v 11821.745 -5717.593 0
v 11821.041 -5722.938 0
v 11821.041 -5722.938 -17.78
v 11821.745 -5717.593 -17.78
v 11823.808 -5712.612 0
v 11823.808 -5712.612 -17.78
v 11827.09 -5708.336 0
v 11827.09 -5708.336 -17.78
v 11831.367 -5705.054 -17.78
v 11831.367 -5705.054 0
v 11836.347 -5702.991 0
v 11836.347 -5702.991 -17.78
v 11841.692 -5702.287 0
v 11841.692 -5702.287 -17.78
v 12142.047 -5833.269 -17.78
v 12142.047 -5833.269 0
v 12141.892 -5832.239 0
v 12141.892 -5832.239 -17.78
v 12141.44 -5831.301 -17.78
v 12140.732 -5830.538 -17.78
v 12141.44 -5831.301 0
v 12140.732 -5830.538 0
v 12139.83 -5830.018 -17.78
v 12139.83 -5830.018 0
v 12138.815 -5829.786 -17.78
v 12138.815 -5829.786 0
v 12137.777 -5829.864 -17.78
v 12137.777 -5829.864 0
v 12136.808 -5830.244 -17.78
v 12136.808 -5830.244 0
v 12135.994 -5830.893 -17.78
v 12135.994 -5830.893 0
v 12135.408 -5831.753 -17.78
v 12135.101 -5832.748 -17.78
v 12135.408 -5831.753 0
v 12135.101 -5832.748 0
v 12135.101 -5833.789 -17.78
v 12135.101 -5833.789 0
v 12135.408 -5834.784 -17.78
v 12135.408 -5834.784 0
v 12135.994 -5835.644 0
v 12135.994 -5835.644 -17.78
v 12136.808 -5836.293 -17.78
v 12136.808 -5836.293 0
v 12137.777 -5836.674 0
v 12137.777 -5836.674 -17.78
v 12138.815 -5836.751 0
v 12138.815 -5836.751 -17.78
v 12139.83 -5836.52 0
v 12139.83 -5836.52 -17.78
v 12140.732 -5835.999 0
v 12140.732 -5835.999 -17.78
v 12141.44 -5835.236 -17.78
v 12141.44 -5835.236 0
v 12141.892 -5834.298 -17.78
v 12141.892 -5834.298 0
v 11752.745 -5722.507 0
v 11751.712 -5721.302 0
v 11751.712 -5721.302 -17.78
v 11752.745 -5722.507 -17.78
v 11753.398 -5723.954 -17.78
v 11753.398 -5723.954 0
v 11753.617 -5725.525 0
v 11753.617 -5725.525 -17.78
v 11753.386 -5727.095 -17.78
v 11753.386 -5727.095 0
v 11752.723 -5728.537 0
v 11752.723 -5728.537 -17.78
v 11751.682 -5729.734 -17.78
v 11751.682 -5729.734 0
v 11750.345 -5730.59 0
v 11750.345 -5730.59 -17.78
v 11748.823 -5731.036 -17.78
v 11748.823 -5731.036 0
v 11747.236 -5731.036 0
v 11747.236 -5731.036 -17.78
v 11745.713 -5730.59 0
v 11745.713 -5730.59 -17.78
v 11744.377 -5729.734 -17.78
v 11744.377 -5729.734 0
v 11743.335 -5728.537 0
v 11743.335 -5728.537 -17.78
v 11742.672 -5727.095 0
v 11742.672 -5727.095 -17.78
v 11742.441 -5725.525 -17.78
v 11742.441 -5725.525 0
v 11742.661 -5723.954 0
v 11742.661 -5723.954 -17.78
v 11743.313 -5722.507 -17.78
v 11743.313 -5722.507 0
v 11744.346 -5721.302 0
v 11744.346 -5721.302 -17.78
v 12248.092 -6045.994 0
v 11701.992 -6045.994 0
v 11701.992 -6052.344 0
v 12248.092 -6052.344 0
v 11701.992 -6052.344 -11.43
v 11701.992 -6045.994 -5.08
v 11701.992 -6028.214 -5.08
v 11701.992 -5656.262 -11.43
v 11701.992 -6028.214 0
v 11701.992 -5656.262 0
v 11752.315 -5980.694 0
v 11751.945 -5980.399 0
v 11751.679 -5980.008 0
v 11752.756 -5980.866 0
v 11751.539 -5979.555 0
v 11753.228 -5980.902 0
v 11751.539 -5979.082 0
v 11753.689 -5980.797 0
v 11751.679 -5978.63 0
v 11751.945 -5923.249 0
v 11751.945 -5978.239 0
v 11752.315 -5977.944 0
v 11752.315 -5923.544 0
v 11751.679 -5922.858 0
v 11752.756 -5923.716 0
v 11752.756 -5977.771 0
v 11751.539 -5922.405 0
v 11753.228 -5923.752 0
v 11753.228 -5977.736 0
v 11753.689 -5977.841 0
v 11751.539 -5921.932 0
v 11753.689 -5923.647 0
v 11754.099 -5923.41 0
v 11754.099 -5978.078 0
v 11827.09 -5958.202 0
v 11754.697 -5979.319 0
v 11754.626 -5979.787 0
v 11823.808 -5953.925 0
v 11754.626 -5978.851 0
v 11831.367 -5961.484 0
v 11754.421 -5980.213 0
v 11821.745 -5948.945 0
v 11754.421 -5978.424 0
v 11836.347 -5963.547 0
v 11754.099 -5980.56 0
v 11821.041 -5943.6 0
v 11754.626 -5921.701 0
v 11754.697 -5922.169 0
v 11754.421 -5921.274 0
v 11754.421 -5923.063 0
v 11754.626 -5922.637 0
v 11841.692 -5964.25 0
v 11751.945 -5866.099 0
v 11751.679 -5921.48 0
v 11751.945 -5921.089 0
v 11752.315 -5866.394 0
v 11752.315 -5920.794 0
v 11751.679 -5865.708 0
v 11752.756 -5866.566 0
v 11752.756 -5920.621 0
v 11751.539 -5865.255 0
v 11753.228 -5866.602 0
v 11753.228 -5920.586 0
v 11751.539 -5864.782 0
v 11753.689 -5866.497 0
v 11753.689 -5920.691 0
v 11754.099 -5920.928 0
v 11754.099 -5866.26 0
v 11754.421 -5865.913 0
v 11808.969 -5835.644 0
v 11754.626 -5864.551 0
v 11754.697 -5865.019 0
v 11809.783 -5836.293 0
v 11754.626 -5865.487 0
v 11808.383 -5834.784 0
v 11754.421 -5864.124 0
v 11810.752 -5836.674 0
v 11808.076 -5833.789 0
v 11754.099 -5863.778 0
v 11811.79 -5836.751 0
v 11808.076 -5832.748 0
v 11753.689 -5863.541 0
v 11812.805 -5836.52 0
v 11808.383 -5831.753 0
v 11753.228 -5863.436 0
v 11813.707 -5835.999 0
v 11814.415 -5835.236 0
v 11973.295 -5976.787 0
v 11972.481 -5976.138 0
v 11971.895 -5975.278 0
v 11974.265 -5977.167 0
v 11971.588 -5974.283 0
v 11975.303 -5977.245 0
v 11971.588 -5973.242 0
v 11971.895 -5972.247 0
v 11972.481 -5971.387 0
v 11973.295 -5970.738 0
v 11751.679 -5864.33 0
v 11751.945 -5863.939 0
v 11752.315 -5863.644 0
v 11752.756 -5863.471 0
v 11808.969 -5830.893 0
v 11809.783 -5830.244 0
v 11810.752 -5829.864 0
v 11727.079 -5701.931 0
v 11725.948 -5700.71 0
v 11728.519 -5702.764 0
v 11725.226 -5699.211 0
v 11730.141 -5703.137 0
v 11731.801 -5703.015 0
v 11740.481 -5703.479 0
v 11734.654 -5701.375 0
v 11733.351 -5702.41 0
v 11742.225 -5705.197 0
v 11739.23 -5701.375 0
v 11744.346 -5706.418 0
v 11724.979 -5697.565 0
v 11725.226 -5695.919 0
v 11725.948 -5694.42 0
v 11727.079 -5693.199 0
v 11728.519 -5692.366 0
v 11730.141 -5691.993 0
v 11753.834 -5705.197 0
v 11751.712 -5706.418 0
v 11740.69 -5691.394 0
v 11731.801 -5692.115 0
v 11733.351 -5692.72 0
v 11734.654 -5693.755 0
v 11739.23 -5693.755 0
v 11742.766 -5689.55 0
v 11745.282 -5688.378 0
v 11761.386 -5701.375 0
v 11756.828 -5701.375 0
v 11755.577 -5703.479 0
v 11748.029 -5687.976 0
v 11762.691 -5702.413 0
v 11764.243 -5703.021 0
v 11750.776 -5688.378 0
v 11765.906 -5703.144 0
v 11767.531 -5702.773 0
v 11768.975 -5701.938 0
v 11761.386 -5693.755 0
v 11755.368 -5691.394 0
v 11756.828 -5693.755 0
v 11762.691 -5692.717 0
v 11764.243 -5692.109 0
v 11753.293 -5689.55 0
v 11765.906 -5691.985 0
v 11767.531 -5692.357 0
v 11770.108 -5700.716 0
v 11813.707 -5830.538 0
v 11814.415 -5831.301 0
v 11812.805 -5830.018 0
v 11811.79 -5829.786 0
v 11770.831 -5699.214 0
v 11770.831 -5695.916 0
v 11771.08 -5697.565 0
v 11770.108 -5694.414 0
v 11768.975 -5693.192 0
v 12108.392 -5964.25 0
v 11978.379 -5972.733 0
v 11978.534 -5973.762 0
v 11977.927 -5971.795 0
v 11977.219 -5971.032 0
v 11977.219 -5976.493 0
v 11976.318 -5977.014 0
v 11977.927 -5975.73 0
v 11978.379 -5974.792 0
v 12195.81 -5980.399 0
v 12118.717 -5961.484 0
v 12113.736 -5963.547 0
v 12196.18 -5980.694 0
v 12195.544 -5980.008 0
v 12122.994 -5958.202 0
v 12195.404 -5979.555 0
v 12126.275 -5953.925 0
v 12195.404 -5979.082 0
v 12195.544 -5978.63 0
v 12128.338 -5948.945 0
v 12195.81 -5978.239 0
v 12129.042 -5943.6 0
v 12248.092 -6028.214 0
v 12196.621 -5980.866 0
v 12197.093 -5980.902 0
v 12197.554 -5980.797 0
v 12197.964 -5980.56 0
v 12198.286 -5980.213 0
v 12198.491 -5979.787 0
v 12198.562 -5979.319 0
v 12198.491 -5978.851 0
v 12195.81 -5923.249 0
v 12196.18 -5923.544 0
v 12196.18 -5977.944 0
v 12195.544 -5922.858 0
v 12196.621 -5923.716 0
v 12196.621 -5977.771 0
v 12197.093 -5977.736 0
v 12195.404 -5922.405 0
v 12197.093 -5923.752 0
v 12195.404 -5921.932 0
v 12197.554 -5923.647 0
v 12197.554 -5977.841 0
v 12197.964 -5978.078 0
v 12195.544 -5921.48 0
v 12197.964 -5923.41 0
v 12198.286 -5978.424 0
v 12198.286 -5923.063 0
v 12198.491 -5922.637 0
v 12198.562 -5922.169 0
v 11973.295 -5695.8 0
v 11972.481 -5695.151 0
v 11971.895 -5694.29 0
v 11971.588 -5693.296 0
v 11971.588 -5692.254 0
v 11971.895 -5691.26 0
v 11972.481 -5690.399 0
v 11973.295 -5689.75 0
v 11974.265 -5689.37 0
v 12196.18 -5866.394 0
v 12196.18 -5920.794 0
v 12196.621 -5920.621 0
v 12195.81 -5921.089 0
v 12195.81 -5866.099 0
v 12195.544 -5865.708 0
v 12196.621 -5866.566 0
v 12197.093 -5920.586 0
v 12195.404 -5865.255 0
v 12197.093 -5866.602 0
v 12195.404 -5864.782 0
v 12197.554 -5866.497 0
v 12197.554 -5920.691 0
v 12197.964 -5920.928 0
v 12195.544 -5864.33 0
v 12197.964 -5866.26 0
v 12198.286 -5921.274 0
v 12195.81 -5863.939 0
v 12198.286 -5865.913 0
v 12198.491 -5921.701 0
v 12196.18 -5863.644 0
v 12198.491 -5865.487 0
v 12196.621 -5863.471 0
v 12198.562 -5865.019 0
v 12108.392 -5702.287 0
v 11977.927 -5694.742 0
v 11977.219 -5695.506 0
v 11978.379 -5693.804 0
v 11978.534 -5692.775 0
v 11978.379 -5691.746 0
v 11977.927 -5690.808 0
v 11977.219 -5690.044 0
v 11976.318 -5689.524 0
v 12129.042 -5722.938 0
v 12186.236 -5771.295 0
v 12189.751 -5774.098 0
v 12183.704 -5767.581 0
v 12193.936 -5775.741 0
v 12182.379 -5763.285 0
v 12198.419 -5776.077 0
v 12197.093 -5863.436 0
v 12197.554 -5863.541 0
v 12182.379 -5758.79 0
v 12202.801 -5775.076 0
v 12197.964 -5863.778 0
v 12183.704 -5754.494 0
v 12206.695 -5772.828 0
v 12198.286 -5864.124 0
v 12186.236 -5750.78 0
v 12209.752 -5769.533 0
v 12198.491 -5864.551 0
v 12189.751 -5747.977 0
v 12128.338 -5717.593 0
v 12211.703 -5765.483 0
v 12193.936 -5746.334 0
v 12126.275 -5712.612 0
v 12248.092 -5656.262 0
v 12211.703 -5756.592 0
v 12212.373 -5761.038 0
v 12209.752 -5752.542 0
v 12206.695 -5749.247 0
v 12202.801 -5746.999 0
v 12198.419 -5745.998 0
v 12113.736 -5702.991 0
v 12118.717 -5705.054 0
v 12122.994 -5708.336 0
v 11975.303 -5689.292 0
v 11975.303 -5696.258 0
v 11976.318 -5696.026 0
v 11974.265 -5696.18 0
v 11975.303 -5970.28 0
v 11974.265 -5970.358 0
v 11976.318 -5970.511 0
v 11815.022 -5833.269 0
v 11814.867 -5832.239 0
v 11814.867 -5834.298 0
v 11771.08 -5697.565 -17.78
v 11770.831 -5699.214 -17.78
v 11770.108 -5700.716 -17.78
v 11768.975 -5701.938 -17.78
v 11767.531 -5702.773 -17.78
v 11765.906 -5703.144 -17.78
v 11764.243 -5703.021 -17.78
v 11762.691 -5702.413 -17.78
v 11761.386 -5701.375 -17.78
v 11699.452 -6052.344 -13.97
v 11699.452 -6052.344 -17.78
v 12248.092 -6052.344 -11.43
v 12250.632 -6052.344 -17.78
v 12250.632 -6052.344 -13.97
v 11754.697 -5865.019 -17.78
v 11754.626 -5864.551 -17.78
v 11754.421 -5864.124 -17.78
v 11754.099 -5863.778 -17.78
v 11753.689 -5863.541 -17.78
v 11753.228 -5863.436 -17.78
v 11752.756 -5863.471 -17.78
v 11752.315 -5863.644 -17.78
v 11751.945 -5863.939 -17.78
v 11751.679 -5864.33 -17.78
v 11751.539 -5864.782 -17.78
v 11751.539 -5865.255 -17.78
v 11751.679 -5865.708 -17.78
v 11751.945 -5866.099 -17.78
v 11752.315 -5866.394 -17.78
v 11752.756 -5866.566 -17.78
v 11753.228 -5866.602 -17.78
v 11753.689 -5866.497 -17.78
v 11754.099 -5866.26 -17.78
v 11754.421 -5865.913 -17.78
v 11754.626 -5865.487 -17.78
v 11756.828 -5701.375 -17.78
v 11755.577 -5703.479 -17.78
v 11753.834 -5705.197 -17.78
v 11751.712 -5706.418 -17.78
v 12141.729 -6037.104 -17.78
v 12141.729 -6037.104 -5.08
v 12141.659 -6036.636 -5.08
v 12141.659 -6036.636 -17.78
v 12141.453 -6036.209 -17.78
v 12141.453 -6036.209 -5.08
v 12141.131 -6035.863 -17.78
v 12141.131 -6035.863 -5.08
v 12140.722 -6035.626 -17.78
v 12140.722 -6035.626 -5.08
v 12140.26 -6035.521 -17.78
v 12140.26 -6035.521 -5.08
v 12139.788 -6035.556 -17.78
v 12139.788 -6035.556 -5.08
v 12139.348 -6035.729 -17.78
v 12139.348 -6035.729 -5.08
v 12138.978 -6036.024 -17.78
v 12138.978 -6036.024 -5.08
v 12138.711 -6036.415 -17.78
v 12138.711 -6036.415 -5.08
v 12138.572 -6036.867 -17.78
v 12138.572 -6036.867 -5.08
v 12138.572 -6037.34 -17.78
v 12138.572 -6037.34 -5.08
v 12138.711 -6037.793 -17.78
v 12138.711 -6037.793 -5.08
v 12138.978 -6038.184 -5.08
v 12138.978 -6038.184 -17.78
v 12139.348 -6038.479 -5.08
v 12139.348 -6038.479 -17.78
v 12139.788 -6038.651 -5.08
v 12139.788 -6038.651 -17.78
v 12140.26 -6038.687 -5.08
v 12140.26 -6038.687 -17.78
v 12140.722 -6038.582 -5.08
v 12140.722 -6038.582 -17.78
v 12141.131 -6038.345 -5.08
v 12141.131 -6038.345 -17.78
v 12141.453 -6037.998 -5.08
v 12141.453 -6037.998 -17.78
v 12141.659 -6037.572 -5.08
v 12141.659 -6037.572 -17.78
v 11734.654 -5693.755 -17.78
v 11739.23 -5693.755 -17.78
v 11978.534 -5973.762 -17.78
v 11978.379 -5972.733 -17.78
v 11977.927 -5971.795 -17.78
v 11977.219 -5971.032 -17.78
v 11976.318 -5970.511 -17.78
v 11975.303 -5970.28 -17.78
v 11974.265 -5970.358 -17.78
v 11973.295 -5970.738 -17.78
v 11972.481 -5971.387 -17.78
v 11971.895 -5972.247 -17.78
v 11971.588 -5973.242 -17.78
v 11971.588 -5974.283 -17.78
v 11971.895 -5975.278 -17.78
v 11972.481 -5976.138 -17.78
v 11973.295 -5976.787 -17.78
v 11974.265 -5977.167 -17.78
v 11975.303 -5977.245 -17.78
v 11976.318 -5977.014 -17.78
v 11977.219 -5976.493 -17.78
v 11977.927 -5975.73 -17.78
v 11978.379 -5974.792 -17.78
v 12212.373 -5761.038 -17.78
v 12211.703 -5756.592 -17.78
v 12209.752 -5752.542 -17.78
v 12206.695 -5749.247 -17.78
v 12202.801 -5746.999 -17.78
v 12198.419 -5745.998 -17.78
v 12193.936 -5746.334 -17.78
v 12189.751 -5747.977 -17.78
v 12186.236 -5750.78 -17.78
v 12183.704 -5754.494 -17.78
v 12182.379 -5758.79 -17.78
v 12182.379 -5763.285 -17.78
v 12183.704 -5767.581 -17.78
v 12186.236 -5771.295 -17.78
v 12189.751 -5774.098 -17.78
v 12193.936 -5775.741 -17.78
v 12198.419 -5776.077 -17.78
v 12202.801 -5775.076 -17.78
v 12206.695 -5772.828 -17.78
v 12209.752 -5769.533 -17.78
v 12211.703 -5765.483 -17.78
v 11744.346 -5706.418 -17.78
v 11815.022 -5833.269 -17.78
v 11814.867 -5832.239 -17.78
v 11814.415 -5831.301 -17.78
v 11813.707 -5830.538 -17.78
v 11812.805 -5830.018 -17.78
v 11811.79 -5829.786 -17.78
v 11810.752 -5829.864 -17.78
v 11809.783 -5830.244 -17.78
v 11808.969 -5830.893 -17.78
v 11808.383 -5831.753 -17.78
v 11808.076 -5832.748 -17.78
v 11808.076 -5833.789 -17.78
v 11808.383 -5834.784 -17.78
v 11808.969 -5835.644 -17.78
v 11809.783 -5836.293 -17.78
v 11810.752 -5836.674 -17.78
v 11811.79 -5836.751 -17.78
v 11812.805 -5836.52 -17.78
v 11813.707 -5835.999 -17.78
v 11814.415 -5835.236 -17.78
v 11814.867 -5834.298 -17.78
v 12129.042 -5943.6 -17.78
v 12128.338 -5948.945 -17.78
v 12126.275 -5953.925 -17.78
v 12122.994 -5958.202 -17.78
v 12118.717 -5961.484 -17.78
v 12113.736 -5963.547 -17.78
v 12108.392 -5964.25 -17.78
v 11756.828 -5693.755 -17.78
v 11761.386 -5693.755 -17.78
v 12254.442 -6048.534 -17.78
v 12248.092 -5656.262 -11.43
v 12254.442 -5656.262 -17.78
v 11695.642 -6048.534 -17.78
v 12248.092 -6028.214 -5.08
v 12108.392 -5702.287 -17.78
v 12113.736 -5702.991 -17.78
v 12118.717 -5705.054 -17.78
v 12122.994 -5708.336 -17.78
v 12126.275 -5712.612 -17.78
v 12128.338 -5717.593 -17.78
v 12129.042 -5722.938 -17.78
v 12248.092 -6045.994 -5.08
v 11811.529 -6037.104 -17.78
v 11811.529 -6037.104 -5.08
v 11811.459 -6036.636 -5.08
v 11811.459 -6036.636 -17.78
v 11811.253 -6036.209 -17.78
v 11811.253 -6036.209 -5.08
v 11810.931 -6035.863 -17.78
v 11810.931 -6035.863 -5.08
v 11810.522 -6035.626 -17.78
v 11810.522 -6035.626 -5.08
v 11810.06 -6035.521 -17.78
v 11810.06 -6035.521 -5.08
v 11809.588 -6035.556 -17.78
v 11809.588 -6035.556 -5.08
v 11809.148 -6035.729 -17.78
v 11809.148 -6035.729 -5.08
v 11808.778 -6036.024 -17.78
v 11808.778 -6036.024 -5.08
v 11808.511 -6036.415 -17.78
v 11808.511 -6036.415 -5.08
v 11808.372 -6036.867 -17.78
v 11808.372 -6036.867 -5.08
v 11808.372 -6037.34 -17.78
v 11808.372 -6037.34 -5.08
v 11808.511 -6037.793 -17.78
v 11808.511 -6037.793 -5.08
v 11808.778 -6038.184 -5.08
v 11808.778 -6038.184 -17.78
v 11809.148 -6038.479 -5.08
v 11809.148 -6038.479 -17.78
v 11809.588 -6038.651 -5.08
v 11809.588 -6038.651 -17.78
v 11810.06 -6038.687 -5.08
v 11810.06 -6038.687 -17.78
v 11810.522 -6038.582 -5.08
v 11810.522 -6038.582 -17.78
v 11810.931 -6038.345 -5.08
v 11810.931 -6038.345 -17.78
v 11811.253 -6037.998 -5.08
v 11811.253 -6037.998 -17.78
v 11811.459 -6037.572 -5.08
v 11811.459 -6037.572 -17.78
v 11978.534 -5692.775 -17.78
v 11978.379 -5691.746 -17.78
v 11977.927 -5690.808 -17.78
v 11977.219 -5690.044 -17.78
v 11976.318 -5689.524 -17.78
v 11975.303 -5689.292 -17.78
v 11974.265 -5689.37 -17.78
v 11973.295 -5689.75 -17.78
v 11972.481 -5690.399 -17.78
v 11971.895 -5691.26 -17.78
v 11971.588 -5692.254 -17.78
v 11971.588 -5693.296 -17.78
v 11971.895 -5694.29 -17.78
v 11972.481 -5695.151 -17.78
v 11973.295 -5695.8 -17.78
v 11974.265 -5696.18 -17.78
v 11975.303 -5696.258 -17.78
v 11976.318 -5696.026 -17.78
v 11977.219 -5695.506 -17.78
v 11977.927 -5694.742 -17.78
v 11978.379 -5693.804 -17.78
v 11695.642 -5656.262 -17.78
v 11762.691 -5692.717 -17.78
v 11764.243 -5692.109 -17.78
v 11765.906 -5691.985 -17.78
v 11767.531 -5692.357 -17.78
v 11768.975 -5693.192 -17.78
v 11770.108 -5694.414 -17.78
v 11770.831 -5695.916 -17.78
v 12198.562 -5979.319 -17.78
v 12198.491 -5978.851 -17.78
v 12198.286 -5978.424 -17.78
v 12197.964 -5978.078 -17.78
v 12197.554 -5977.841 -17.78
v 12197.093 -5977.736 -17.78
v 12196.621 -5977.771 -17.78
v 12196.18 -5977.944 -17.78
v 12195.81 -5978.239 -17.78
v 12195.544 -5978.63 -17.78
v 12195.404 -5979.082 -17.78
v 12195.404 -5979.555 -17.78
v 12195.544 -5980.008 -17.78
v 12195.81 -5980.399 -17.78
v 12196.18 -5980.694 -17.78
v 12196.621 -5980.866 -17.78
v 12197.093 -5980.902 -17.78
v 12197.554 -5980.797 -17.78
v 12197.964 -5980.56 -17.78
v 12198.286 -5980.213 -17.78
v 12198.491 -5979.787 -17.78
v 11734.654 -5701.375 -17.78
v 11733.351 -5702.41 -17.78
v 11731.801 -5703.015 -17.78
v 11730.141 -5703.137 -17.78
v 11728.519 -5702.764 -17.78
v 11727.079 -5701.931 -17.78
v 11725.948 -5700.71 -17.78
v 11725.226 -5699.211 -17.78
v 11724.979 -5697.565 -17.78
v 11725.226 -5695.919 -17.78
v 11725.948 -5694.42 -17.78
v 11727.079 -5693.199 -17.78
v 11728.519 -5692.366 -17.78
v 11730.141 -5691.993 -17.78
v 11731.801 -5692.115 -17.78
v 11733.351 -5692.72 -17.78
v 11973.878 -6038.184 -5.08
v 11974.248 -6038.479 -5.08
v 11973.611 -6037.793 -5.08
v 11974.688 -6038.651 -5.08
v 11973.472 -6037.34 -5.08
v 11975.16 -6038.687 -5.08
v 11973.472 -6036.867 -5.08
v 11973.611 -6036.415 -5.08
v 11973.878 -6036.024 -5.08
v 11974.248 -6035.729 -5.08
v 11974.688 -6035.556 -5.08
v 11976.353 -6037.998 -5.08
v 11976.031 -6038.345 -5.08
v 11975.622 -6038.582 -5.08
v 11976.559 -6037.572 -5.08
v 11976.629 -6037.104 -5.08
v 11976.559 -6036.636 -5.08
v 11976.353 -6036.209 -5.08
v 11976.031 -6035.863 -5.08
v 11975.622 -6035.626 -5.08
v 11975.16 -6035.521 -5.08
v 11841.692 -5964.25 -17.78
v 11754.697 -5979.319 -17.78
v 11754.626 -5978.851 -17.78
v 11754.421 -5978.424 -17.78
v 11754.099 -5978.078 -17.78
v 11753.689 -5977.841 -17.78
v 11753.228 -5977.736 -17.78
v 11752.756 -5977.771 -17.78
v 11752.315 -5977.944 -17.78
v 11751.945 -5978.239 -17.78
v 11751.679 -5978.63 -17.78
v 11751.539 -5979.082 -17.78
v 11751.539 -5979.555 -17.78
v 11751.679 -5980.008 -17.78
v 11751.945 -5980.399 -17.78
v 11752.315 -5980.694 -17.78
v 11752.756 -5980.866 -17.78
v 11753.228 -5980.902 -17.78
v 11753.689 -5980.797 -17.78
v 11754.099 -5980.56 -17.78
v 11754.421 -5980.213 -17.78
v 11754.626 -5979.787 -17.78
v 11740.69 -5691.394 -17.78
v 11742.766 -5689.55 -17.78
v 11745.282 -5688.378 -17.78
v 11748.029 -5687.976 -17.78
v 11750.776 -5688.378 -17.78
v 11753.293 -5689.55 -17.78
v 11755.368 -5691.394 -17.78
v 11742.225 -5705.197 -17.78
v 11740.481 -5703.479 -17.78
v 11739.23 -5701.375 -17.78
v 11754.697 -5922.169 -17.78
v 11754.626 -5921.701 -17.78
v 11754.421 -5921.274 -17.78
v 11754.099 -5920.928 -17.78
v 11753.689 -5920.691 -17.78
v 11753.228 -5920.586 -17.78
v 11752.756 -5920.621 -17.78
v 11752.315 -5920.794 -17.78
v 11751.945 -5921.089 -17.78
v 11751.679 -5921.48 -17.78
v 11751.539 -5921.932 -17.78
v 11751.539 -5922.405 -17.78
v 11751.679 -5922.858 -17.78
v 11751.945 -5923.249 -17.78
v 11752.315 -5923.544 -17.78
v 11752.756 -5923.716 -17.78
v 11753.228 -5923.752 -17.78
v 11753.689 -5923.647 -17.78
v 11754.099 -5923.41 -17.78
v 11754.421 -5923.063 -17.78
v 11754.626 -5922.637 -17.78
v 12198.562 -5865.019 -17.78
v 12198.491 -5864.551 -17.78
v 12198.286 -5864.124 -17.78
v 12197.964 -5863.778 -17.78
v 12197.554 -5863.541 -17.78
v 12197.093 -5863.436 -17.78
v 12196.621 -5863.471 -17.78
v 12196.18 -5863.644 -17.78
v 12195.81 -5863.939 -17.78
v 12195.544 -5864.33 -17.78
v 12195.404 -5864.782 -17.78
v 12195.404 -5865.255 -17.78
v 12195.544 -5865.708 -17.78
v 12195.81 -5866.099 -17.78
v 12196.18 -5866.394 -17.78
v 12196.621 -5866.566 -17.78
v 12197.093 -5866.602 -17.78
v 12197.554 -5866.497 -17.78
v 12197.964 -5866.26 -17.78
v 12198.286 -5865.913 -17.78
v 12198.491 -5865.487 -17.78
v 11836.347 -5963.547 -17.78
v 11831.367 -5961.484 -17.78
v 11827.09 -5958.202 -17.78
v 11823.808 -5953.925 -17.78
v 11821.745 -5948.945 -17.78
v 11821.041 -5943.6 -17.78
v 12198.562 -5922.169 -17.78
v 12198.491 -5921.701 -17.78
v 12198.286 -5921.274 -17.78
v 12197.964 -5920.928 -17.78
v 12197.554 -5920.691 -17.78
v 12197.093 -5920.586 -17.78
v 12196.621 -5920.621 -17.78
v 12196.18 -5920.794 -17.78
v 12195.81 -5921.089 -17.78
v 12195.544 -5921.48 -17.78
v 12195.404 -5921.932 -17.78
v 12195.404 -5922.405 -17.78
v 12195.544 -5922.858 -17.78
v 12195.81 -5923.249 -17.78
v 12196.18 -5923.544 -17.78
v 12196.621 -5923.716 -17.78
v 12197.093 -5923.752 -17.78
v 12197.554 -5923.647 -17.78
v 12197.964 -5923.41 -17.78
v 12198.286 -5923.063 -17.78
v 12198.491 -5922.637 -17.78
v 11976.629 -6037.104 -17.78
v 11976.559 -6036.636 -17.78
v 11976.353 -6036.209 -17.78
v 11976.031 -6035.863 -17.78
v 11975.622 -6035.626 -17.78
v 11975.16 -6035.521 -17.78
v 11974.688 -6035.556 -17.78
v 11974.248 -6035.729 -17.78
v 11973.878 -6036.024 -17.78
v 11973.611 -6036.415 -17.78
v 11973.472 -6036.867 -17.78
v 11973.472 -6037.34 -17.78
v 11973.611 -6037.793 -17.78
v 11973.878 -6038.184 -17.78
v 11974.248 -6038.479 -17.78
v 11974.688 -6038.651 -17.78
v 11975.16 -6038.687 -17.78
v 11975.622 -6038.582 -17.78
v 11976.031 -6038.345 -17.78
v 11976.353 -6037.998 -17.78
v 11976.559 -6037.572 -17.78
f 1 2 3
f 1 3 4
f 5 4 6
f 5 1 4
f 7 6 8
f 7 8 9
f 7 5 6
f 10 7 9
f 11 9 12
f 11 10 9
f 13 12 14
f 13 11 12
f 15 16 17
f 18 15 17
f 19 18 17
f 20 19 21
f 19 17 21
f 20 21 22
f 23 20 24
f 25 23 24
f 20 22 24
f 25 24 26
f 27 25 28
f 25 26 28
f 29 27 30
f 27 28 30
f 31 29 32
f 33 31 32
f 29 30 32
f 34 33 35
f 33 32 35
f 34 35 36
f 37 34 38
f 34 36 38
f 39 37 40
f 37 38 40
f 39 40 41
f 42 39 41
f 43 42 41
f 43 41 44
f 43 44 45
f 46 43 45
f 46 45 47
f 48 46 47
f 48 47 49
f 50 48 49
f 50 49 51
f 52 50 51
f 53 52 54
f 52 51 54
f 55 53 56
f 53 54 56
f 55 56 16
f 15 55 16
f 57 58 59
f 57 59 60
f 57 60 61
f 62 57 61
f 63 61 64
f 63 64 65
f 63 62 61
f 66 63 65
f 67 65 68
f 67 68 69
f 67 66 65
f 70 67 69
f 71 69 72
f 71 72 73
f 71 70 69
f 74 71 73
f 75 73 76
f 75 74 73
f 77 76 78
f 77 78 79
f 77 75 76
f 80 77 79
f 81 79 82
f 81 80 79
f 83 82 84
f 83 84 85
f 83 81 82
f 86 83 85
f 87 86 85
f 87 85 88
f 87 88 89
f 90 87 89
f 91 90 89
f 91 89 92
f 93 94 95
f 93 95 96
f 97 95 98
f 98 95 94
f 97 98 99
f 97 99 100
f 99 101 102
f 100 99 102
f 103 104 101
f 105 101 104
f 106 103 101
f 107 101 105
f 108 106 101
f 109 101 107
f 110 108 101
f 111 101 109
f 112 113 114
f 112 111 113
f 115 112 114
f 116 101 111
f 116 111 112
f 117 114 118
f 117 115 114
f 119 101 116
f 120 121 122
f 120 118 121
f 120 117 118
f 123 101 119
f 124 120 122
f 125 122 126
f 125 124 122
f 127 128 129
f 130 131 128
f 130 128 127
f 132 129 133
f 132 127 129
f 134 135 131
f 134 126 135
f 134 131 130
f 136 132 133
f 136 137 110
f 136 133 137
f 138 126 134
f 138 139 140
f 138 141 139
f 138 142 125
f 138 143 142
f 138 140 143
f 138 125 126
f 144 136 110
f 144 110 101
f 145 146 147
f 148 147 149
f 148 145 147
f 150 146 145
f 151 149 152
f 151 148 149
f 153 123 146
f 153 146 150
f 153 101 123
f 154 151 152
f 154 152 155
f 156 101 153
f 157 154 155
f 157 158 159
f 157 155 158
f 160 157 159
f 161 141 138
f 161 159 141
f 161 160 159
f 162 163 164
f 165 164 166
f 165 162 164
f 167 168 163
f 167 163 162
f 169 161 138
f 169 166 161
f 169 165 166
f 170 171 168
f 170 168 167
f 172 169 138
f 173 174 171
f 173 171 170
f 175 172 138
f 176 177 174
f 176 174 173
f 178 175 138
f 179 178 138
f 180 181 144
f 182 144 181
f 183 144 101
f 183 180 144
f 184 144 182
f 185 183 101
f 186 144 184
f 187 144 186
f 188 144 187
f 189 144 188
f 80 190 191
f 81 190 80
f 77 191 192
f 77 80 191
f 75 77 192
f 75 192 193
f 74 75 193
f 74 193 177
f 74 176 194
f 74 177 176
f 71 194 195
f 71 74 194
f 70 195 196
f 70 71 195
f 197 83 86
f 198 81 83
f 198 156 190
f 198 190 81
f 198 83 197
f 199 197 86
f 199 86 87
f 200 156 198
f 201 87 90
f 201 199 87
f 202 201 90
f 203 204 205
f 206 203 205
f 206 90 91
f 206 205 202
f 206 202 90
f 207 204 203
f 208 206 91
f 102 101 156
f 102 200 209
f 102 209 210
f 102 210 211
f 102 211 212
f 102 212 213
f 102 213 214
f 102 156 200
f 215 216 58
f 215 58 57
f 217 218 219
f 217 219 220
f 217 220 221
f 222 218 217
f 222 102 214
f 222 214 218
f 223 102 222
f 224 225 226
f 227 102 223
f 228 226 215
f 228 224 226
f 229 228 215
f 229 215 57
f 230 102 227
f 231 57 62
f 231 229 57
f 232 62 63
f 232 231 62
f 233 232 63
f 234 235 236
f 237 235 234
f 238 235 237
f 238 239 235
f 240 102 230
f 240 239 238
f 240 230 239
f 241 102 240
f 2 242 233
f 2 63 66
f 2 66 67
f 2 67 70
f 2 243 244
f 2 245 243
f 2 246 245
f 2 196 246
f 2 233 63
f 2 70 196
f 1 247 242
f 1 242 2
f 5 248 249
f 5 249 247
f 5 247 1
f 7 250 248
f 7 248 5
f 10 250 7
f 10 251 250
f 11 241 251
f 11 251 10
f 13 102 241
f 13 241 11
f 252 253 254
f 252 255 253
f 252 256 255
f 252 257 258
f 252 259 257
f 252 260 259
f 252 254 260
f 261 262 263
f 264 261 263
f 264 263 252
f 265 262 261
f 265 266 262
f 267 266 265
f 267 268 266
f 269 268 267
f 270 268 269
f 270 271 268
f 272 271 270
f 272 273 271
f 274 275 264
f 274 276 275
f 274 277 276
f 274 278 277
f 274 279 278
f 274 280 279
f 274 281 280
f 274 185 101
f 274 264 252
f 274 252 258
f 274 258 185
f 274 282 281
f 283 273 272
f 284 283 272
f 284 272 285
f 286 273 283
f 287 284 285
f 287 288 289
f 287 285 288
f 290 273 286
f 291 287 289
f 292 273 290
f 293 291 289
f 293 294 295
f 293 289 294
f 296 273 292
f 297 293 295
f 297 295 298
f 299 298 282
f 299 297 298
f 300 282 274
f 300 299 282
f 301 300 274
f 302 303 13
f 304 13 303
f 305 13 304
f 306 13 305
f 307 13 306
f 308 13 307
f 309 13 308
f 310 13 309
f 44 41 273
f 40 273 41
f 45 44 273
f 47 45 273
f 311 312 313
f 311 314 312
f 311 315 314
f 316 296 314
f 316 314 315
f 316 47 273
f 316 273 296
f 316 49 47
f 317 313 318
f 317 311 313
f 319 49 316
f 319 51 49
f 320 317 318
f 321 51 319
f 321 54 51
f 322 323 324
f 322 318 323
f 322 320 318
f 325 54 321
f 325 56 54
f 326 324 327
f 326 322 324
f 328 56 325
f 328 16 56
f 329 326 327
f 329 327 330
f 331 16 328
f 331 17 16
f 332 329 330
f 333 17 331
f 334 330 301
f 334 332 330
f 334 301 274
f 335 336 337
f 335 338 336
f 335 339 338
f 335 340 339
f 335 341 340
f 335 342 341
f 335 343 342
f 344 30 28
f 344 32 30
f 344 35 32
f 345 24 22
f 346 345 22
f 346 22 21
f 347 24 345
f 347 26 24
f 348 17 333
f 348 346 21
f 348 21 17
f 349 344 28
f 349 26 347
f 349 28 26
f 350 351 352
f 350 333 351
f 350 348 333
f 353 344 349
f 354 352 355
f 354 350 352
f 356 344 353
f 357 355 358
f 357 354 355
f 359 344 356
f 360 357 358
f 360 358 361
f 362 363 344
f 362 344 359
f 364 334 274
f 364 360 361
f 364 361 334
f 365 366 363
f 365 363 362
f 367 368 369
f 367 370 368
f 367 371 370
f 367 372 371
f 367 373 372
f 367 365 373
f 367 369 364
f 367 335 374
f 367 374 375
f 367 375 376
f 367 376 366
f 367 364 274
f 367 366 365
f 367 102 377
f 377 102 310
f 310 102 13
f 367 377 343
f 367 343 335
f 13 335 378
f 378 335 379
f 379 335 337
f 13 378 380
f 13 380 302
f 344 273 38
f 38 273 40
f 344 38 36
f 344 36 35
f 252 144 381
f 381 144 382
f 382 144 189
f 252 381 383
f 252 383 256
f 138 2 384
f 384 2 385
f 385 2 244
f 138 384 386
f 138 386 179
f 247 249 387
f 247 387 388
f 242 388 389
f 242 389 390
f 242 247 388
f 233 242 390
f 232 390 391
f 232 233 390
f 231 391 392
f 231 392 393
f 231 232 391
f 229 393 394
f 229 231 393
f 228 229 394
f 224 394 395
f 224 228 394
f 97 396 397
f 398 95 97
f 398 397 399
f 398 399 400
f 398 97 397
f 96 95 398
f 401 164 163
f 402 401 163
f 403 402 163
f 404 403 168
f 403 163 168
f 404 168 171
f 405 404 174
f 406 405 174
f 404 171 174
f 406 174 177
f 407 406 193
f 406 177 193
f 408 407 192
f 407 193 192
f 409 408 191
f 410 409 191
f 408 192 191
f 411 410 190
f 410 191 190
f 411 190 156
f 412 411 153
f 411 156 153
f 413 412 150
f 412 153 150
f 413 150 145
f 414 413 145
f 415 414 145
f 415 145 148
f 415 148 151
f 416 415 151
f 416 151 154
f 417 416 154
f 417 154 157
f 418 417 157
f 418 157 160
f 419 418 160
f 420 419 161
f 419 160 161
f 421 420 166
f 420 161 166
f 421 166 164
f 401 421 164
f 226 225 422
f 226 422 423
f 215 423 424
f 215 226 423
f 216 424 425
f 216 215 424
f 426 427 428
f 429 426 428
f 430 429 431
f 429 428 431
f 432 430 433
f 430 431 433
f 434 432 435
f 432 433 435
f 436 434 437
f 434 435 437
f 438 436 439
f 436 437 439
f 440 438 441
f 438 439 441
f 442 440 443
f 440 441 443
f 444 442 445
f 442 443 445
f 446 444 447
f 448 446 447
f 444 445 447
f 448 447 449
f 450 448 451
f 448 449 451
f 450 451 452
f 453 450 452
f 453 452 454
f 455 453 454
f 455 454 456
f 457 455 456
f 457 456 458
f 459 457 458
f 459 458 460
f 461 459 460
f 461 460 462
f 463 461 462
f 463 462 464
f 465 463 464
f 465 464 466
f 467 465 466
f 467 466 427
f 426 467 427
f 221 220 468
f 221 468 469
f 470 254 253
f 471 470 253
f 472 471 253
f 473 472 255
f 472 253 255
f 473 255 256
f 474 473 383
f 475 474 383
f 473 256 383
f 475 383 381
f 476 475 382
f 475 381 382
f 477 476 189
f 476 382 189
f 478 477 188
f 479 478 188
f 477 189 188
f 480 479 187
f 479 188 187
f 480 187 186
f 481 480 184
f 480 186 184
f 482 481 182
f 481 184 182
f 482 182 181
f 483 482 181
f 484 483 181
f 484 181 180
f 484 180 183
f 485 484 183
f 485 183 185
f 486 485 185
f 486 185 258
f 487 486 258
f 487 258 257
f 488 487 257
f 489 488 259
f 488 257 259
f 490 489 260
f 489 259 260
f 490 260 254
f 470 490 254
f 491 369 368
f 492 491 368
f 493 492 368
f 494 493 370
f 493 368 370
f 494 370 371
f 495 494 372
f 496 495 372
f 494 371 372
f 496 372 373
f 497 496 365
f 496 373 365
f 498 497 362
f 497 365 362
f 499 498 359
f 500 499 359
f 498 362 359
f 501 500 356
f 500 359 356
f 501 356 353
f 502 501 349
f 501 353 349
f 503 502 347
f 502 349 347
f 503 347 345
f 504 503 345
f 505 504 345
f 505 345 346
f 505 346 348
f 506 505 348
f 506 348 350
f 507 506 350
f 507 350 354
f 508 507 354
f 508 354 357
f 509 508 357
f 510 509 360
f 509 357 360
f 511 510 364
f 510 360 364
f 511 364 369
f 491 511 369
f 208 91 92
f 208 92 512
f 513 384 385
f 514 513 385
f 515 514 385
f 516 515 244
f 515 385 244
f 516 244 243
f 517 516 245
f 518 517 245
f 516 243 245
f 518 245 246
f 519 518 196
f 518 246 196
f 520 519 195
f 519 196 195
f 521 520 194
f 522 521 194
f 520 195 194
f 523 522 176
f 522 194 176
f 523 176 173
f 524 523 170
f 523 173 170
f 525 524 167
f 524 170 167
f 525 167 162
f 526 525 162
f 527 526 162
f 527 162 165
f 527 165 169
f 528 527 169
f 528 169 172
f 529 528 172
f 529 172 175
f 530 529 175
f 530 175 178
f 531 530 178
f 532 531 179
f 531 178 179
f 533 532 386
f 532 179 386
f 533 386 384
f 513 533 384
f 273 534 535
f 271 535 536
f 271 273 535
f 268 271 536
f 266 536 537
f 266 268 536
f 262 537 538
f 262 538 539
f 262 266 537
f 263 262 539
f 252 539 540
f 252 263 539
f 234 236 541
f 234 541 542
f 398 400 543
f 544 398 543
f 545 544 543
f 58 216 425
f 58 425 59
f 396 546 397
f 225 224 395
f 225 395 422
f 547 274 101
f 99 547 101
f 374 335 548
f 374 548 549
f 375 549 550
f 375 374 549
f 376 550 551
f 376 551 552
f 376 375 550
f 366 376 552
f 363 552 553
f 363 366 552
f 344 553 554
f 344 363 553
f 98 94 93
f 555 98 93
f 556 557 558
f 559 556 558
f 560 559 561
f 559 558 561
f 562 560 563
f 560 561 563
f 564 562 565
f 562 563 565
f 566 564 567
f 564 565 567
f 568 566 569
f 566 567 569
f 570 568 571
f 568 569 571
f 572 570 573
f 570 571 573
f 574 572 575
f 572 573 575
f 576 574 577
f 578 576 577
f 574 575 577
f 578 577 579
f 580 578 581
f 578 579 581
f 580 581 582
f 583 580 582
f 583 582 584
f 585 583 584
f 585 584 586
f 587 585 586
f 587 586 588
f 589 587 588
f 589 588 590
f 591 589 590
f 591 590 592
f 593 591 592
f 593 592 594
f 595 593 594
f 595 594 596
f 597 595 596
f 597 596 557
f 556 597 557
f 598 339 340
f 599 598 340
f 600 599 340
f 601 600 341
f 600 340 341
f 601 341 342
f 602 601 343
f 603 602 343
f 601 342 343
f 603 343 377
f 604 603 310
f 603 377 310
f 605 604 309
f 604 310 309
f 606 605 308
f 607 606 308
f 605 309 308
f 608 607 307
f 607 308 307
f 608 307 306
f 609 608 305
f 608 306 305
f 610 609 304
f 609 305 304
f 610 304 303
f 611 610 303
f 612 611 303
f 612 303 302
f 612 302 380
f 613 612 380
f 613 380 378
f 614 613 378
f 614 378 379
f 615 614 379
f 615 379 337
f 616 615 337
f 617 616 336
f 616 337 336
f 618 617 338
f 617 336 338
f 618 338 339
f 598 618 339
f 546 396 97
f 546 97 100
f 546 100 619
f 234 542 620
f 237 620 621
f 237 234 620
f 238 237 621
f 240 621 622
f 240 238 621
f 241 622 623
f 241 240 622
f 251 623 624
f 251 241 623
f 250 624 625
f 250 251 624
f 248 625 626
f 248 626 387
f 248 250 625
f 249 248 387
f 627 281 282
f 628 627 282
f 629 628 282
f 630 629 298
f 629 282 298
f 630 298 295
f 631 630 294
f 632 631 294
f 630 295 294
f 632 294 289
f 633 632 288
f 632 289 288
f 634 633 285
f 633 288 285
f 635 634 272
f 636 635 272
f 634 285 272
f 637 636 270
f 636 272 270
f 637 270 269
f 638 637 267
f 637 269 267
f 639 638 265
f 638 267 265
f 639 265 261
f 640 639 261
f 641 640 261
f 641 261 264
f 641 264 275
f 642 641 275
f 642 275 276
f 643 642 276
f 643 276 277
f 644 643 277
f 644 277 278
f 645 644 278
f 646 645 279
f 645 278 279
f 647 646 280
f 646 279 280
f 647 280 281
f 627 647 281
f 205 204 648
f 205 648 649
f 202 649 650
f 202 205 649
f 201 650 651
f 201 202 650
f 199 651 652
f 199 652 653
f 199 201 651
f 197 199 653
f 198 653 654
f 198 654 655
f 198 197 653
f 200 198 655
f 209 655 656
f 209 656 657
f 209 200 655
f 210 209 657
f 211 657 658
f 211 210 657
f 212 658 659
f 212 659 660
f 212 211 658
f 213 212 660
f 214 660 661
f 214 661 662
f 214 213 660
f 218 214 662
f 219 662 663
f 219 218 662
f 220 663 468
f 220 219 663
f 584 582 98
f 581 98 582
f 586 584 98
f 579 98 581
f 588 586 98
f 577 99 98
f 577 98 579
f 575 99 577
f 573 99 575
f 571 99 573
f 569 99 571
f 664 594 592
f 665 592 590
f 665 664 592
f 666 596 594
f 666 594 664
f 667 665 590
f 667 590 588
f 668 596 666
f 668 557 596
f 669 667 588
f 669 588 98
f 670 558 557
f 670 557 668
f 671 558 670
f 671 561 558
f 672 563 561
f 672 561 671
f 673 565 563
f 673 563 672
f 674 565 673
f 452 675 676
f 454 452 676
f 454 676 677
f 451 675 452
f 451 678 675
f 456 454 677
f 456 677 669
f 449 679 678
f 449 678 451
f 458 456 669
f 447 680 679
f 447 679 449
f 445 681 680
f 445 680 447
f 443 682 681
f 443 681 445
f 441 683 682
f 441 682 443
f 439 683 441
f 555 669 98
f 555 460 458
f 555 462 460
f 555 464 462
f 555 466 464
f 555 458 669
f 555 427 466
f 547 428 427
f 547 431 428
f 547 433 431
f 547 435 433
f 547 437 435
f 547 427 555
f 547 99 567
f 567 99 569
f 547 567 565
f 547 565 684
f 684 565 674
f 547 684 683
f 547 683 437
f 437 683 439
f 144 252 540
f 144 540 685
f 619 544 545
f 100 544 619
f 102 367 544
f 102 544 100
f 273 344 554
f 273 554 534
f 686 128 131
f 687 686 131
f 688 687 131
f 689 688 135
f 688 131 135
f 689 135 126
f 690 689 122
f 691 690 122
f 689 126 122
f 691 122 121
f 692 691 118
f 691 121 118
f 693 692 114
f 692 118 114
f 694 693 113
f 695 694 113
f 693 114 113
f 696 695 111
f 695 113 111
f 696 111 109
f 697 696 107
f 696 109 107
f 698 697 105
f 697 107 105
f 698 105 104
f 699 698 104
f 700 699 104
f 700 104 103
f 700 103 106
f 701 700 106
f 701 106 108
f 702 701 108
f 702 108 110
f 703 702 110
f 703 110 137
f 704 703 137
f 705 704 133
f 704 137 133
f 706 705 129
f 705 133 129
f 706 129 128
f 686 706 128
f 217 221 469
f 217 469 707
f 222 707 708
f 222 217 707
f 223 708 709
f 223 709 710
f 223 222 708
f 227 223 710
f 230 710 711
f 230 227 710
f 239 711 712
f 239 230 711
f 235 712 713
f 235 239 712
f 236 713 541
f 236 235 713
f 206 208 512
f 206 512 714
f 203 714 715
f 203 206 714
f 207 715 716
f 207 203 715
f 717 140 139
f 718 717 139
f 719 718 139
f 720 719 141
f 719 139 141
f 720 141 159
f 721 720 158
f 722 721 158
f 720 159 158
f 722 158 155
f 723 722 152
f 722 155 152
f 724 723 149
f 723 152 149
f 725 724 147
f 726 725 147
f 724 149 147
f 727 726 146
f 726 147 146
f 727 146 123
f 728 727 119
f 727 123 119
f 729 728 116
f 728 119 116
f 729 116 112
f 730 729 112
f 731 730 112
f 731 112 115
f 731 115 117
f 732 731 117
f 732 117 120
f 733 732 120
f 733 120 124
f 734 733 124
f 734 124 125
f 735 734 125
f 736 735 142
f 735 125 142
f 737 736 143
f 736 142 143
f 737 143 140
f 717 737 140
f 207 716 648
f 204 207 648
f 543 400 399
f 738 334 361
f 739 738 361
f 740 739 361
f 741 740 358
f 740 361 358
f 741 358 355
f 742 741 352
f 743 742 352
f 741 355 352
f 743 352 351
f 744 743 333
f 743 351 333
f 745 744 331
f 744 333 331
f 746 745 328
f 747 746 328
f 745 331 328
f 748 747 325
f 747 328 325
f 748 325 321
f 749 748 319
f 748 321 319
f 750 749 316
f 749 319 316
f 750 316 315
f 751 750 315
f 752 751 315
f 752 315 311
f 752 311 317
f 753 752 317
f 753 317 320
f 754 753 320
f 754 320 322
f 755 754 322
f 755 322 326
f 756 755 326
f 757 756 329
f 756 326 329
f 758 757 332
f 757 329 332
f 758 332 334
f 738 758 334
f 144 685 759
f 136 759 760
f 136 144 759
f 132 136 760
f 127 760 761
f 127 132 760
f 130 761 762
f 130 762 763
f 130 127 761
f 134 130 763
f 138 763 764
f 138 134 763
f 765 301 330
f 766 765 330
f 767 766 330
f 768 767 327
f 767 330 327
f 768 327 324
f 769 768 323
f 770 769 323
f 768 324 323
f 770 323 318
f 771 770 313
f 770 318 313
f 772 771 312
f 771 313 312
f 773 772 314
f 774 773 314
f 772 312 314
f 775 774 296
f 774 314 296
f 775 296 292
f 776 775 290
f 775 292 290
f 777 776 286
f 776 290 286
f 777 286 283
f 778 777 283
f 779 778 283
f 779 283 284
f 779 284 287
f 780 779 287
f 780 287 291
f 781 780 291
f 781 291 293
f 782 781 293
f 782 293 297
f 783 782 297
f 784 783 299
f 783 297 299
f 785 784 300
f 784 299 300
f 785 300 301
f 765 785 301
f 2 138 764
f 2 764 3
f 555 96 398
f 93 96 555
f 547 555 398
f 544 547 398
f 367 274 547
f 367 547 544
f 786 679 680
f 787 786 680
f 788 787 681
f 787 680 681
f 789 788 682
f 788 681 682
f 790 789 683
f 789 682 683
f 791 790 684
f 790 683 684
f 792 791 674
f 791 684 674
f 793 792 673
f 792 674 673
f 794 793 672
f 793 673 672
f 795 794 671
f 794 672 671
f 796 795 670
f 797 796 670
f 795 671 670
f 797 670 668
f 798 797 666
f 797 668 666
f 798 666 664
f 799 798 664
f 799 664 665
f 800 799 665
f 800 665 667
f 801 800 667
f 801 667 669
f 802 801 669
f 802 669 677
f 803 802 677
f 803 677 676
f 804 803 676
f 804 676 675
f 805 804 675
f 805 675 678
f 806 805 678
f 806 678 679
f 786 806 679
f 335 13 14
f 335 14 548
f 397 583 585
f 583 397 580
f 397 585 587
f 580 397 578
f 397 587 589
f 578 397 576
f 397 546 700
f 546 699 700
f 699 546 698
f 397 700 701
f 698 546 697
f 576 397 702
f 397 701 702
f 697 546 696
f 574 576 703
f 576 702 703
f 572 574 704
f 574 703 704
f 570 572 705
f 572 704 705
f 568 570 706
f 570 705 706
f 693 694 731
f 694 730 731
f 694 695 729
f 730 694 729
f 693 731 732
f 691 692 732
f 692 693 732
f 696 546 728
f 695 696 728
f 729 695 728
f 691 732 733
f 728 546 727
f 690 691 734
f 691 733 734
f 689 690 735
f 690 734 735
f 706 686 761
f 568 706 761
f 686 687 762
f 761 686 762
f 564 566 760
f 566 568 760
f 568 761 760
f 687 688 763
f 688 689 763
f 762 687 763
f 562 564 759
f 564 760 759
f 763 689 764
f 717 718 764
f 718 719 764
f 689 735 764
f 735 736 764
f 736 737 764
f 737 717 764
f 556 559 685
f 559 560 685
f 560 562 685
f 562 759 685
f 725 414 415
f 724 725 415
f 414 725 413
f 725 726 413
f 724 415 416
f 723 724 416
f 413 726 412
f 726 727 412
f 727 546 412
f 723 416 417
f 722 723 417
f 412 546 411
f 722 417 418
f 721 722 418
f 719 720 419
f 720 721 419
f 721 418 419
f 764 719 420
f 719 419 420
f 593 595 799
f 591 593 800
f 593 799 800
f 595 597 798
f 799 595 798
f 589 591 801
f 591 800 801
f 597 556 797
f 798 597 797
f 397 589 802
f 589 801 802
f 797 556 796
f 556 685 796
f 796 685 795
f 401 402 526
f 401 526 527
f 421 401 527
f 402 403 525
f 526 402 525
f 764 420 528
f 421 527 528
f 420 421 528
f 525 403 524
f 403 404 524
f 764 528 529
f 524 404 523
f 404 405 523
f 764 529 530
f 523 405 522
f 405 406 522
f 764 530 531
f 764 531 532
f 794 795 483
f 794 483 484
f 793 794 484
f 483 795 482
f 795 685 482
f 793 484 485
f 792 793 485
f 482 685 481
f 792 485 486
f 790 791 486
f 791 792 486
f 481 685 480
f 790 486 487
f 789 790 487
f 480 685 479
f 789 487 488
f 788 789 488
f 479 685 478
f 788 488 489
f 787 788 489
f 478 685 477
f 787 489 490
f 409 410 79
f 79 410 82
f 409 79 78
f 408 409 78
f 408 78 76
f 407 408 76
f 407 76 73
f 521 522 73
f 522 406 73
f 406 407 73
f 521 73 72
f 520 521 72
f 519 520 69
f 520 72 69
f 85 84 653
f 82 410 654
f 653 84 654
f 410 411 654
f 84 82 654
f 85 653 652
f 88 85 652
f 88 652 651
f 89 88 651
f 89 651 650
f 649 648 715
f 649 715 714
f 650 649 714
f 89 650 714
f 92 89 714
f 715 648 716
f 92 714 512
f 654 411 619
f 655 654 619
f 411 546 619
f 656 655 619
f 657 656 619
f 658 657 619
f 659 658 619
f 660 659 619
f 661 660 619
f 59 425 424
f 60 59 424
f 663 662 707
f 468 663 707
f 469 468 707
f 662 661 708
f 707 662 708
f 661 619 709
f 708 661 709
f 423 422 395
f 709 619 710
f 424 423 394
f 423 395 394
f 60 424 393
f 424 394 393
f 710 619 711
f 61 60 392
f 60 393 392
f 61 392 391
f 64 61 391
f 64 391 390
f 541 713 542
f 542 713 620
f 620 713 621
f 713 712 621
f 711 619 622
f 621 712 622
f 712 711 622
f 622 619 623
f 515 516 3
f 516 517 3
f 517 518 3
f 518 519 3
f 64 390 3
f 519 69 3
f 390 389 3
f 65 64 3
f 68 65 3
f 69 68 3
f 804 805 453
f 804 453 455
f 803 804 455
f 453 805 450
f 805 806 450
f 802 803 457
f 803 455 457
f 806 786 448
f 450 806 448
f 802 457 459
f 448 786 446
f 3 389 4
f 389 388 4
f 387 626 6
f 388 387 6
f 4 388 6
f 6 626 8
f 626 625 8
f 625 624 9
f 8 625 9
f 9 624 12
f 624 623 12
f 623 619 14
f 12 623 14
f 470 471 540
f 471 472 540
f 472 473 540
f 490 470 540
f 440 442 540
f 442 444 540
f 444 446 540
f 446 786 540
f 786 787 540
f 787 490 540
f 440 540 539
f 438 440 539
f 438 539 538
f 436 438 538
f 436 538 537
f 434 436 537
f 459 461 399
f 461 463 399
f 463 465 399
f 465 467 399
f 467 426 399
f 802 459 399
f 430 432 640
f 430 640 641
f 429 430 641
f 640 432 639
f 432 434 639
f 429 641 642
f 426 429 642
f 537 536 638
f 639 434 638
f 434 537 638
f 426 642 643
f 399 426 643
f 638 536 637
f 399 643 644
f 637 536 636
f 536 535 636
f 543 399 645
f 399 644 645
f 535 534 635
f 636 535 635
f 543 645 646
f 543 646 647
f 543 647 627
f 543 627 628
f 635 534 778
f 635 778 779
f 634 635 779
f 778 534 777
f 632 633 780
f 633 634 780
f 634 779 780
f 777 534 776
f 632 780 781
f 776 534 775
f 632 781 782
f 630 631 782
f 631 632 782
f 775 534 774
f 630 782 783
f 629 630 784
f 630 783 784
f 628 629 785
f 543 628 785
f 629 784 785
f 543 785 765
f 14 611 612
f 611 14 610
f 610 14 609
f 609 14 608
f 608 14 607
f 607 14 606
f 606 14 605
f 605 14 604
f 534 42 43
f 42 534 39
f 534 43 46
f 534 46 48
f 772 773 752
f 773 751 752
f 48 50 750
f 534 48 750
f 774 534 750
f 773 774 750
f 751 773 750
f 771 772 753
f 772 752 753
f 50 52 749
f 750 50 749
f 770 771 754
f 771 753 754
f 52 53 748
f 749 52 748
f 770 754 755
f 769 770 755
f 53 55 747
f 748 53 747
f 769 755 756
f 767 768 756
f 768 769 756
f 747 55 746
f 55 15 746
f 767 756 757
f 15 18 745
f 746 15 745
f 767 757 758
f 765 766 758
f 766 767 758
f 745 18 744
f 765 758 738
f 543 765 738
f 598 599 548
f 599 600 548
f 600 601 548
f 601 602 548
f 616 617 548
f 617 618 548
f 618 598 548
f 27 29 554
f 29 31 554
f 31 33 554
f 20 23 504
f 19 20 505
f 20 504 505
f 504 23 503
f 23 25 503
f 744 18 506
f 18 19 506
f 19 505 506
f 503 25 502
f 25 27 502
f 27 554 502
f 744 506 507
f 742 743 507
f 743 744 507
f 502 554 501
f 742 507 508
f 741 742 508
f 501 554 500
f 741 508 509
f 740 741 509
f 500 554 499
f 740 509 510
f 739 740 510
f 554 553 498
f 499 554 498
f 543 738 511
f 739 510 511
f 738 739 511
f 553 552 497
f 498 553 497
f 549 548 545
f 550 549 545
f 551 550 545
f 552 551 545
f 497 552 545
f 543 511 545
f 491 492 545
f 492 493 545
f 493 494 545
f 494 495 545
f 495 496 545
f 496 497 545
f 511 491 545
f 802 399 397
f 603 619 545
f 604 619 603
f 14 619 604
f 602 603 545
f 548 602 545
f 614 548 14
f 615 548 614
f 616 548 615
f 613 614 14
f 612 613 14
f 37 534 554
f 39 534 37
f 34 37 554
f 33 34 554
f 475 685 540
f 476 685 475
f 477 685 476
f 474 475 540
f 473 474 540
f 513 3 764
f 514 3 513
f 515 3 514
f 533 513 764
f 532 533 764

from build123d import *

# Parameters (mm, degrees)
EXTRUDE1_DEPTH     = 17.78
SKETCH3_R          = 15.08125
SKETCH3_R_2        = 3.4925
SKETCH3_R_3        = 1.5875
CUT_EXTRUDE1_DEPTH = 17.78
CUT_EXTRUDE2_DEPTH = 5.08
SKETCH5_W          = 14.2875
SKETCH5_H          = 404.0251
CUT_EXTRUDE3_DEPTH = 11.43
CUT_EXTRUDE4_DEPTH = 396.08125


with BuildPart() as part:
    # Sketch2 → Extrude1 (new body)
    with BuildSketch(Plane.XY):
        Polygon((11695.641666666, -6048.53375), (11699.451666666, -6052.34375), (12250.631666666, -6052.34375), (12254.441666666, -6048.53375), (12254.441666666, -5656.2625), (11695.641666666, -5656.2625), align=None)
    extrude(amount=-EXTRUDE1_DEPTH)

    # Sketch3 → Cut-Extrude1 (cut)
    with BuildSketch(Plane.XY):
        with Locations((12197.291666666, -5761.0375)):
            Circle(SKETCH3_R)
        with Locations((12138.554166666, -5833.26875)):
            Circle(SKETCH3_R_2)
        with Locations((12196.974166666, -5865.01875)):
            Circle(SKETCH3_R_3)
        with Locations((12196.974166666, -5922.16875)):
            Circle(SKETCH3_R_3)
        with Locations((12196.974166666, -5979.31875)):
            Circle(SKETCH3_R_3)
        with Locations((12140.141666666, -6037.10375)):
            Circle(SKETCH3_R_3)
        with Locations((11975.041666666, -6037.10375)):
            Circle(SKETCH3_R_3)
        with Locations((11809.941666666, -6037.10375)):
            Circle(SKETCH3_R_3)
        with Locations((11753.109166666, -5979.31875)):
            Circle(SKETCH3_R_3)
        with Locations((11753.109166666, -5922.16875)):
            Circle(SKETCH3_R_3)
        with Locations((11753.109166666, -5865.01875)):
            Circle(SKETCH3_R_3)
        with Locations((11811.529166666, -5833.26875)):
            Circle(SKETCH3_R_2)
        with Locations((11975.041666666, -5973.7625)):
            Circle(SKETCH3_R_2)
        with Locations((11975.041666666, -5692.775)):
            Circle(SKETCH3_R_2)
        with BuildLine():
            Line((11841.691666666, -5702.2873), (12108.391666666, -5702.2873))
            ThreePointArc((12108.391666666, -5702.2873), (12122.993563119, -5708.335603547), (12129.041866666, -5722.9375))
            Line((12129.041866666, -5722.9375), (12129.041866666, -5943.6))
            ThreePointArc((12129.041866666, -5943.6), (12122.993563119, -5958.201896453), (12108.391666666, -5964.2502))
            Line((12108.391666666, -5964.2502), (11841.691666666, -5964.2502))
            ThreePointArc((11841.691666666, -5964.2502), (11827.089770213, -5958.201896453), (11821.041466666, -5943.6))
            Line((11821.041466666, -5943.6), (11821.041466666, -5722.9375))
            ThreePointArc((11821.041466666, -5722.9375), (11827.089770213, -5708.335603547), (11841.691666666, -5702.2873))
        make_face()
        with BuildLine():
            Line((11734.654409808, -5693.754968556), (11739.23011943, -5693.754968556))
            ThreePointArc((11739.23011943, -5693.754968556), (11748.029166666, -5687.976468556), (11756.828213901, -5693.754968556))
            Line((11756.828213901, -5693.754968556), (11761.386355753, -5693.754968556))
            ThreePointArc((11761.386355753, -5693.754968556), (11767.531113043, -5692.357368906), (11771.079666666, -5697.564968556))
            ThreePointArc((11771.079666666, -5697.564968556), (11767.531113043, -5702.772568206), (11761.386355753, -5701.374968556))
            Line((11761.386355753, -5701.374968556), (11756.828213901, -5701.374968556))
            ThreePointArc((11756.828213901, -5701.374968556), (11754.760305425, -5704.393665595), (11751.712166666, -5706.417925308))
            Line((11751.712166666, -5706.417925308), (11751.712166666, -5721.30243896))
            ThreePointArc((11751.712166666, -5721.30243896), (11748.029166666, -5731.092968556), (11744.346166666, -5721.30243896))
            Line((11744.346166666, -5721.30243896), (11744.346166666, -5706.417925308))
            ThreePointArc((11744.346166666, -5706.417925308), (11741.298027907, -5704.393665595), (11739.23011943, -5701.374968556))
            Line((11739.23011943, -5701.374968556), (11734.654409809, -5701.374968556))
            ThreePointArc((11734.654409809, -5701.374968556), (11724.978666666, -5697.564968556), (11734.654409808, -5693.754968556))
        make_face()
    extrude(amount=-CUT_EXTRUDE1_DEPTH, mode=Mode.SUBTRACT)

    # Sketch4 → Cut-Extrude2 (cut)
    with BuildSketch(Plane.XY):
        Polygon((11975.041666666, -6028.21375), (11695.641666666, -6028.21375), (11695.641666666, -6045.99375), (12254.441666666, -6045.99375), (12254.441666666, -6028.21375), align=None)
    extrude(amount=-CUT_EXTRUDE2_DEPTH, mode=Mode.SUBTRACT)

    # Sketch5 → Cut-Extrude3 (cut)
    with BuildSketch(Plane.XY):
        with Locations((11694.847916666, -5853.51255)):
            Rectangle(SKETCH5_W, SKETCH5_H)
        with Locations((12255.235416666, -5853.51255)):
            Rectangle(SKETCH5_W, SKETCH5_H)
    extrude(amount=-CUT_EXTRUDE3_DEPTH, mode=Mode.SUBTRACT)

    # Sketch7 → Cut-Extrude4 (cut)
    with BuildSketch(Plane.XZ.offset(6052.34375)):
        Polygon((12254.441666666, -17.78), (12254.441666666, -11.43), (12248.091666666, -11.43), align=None)
        Polygon((11695.641666666, -17.78), (11695.641666666, -11.43), (11701.991666666, -11.43), align=None)
    extrude(amount=-CUT_EXTRUDE4_DEPTH, mode=Mode.SUBTRACT)


solid = part.part
